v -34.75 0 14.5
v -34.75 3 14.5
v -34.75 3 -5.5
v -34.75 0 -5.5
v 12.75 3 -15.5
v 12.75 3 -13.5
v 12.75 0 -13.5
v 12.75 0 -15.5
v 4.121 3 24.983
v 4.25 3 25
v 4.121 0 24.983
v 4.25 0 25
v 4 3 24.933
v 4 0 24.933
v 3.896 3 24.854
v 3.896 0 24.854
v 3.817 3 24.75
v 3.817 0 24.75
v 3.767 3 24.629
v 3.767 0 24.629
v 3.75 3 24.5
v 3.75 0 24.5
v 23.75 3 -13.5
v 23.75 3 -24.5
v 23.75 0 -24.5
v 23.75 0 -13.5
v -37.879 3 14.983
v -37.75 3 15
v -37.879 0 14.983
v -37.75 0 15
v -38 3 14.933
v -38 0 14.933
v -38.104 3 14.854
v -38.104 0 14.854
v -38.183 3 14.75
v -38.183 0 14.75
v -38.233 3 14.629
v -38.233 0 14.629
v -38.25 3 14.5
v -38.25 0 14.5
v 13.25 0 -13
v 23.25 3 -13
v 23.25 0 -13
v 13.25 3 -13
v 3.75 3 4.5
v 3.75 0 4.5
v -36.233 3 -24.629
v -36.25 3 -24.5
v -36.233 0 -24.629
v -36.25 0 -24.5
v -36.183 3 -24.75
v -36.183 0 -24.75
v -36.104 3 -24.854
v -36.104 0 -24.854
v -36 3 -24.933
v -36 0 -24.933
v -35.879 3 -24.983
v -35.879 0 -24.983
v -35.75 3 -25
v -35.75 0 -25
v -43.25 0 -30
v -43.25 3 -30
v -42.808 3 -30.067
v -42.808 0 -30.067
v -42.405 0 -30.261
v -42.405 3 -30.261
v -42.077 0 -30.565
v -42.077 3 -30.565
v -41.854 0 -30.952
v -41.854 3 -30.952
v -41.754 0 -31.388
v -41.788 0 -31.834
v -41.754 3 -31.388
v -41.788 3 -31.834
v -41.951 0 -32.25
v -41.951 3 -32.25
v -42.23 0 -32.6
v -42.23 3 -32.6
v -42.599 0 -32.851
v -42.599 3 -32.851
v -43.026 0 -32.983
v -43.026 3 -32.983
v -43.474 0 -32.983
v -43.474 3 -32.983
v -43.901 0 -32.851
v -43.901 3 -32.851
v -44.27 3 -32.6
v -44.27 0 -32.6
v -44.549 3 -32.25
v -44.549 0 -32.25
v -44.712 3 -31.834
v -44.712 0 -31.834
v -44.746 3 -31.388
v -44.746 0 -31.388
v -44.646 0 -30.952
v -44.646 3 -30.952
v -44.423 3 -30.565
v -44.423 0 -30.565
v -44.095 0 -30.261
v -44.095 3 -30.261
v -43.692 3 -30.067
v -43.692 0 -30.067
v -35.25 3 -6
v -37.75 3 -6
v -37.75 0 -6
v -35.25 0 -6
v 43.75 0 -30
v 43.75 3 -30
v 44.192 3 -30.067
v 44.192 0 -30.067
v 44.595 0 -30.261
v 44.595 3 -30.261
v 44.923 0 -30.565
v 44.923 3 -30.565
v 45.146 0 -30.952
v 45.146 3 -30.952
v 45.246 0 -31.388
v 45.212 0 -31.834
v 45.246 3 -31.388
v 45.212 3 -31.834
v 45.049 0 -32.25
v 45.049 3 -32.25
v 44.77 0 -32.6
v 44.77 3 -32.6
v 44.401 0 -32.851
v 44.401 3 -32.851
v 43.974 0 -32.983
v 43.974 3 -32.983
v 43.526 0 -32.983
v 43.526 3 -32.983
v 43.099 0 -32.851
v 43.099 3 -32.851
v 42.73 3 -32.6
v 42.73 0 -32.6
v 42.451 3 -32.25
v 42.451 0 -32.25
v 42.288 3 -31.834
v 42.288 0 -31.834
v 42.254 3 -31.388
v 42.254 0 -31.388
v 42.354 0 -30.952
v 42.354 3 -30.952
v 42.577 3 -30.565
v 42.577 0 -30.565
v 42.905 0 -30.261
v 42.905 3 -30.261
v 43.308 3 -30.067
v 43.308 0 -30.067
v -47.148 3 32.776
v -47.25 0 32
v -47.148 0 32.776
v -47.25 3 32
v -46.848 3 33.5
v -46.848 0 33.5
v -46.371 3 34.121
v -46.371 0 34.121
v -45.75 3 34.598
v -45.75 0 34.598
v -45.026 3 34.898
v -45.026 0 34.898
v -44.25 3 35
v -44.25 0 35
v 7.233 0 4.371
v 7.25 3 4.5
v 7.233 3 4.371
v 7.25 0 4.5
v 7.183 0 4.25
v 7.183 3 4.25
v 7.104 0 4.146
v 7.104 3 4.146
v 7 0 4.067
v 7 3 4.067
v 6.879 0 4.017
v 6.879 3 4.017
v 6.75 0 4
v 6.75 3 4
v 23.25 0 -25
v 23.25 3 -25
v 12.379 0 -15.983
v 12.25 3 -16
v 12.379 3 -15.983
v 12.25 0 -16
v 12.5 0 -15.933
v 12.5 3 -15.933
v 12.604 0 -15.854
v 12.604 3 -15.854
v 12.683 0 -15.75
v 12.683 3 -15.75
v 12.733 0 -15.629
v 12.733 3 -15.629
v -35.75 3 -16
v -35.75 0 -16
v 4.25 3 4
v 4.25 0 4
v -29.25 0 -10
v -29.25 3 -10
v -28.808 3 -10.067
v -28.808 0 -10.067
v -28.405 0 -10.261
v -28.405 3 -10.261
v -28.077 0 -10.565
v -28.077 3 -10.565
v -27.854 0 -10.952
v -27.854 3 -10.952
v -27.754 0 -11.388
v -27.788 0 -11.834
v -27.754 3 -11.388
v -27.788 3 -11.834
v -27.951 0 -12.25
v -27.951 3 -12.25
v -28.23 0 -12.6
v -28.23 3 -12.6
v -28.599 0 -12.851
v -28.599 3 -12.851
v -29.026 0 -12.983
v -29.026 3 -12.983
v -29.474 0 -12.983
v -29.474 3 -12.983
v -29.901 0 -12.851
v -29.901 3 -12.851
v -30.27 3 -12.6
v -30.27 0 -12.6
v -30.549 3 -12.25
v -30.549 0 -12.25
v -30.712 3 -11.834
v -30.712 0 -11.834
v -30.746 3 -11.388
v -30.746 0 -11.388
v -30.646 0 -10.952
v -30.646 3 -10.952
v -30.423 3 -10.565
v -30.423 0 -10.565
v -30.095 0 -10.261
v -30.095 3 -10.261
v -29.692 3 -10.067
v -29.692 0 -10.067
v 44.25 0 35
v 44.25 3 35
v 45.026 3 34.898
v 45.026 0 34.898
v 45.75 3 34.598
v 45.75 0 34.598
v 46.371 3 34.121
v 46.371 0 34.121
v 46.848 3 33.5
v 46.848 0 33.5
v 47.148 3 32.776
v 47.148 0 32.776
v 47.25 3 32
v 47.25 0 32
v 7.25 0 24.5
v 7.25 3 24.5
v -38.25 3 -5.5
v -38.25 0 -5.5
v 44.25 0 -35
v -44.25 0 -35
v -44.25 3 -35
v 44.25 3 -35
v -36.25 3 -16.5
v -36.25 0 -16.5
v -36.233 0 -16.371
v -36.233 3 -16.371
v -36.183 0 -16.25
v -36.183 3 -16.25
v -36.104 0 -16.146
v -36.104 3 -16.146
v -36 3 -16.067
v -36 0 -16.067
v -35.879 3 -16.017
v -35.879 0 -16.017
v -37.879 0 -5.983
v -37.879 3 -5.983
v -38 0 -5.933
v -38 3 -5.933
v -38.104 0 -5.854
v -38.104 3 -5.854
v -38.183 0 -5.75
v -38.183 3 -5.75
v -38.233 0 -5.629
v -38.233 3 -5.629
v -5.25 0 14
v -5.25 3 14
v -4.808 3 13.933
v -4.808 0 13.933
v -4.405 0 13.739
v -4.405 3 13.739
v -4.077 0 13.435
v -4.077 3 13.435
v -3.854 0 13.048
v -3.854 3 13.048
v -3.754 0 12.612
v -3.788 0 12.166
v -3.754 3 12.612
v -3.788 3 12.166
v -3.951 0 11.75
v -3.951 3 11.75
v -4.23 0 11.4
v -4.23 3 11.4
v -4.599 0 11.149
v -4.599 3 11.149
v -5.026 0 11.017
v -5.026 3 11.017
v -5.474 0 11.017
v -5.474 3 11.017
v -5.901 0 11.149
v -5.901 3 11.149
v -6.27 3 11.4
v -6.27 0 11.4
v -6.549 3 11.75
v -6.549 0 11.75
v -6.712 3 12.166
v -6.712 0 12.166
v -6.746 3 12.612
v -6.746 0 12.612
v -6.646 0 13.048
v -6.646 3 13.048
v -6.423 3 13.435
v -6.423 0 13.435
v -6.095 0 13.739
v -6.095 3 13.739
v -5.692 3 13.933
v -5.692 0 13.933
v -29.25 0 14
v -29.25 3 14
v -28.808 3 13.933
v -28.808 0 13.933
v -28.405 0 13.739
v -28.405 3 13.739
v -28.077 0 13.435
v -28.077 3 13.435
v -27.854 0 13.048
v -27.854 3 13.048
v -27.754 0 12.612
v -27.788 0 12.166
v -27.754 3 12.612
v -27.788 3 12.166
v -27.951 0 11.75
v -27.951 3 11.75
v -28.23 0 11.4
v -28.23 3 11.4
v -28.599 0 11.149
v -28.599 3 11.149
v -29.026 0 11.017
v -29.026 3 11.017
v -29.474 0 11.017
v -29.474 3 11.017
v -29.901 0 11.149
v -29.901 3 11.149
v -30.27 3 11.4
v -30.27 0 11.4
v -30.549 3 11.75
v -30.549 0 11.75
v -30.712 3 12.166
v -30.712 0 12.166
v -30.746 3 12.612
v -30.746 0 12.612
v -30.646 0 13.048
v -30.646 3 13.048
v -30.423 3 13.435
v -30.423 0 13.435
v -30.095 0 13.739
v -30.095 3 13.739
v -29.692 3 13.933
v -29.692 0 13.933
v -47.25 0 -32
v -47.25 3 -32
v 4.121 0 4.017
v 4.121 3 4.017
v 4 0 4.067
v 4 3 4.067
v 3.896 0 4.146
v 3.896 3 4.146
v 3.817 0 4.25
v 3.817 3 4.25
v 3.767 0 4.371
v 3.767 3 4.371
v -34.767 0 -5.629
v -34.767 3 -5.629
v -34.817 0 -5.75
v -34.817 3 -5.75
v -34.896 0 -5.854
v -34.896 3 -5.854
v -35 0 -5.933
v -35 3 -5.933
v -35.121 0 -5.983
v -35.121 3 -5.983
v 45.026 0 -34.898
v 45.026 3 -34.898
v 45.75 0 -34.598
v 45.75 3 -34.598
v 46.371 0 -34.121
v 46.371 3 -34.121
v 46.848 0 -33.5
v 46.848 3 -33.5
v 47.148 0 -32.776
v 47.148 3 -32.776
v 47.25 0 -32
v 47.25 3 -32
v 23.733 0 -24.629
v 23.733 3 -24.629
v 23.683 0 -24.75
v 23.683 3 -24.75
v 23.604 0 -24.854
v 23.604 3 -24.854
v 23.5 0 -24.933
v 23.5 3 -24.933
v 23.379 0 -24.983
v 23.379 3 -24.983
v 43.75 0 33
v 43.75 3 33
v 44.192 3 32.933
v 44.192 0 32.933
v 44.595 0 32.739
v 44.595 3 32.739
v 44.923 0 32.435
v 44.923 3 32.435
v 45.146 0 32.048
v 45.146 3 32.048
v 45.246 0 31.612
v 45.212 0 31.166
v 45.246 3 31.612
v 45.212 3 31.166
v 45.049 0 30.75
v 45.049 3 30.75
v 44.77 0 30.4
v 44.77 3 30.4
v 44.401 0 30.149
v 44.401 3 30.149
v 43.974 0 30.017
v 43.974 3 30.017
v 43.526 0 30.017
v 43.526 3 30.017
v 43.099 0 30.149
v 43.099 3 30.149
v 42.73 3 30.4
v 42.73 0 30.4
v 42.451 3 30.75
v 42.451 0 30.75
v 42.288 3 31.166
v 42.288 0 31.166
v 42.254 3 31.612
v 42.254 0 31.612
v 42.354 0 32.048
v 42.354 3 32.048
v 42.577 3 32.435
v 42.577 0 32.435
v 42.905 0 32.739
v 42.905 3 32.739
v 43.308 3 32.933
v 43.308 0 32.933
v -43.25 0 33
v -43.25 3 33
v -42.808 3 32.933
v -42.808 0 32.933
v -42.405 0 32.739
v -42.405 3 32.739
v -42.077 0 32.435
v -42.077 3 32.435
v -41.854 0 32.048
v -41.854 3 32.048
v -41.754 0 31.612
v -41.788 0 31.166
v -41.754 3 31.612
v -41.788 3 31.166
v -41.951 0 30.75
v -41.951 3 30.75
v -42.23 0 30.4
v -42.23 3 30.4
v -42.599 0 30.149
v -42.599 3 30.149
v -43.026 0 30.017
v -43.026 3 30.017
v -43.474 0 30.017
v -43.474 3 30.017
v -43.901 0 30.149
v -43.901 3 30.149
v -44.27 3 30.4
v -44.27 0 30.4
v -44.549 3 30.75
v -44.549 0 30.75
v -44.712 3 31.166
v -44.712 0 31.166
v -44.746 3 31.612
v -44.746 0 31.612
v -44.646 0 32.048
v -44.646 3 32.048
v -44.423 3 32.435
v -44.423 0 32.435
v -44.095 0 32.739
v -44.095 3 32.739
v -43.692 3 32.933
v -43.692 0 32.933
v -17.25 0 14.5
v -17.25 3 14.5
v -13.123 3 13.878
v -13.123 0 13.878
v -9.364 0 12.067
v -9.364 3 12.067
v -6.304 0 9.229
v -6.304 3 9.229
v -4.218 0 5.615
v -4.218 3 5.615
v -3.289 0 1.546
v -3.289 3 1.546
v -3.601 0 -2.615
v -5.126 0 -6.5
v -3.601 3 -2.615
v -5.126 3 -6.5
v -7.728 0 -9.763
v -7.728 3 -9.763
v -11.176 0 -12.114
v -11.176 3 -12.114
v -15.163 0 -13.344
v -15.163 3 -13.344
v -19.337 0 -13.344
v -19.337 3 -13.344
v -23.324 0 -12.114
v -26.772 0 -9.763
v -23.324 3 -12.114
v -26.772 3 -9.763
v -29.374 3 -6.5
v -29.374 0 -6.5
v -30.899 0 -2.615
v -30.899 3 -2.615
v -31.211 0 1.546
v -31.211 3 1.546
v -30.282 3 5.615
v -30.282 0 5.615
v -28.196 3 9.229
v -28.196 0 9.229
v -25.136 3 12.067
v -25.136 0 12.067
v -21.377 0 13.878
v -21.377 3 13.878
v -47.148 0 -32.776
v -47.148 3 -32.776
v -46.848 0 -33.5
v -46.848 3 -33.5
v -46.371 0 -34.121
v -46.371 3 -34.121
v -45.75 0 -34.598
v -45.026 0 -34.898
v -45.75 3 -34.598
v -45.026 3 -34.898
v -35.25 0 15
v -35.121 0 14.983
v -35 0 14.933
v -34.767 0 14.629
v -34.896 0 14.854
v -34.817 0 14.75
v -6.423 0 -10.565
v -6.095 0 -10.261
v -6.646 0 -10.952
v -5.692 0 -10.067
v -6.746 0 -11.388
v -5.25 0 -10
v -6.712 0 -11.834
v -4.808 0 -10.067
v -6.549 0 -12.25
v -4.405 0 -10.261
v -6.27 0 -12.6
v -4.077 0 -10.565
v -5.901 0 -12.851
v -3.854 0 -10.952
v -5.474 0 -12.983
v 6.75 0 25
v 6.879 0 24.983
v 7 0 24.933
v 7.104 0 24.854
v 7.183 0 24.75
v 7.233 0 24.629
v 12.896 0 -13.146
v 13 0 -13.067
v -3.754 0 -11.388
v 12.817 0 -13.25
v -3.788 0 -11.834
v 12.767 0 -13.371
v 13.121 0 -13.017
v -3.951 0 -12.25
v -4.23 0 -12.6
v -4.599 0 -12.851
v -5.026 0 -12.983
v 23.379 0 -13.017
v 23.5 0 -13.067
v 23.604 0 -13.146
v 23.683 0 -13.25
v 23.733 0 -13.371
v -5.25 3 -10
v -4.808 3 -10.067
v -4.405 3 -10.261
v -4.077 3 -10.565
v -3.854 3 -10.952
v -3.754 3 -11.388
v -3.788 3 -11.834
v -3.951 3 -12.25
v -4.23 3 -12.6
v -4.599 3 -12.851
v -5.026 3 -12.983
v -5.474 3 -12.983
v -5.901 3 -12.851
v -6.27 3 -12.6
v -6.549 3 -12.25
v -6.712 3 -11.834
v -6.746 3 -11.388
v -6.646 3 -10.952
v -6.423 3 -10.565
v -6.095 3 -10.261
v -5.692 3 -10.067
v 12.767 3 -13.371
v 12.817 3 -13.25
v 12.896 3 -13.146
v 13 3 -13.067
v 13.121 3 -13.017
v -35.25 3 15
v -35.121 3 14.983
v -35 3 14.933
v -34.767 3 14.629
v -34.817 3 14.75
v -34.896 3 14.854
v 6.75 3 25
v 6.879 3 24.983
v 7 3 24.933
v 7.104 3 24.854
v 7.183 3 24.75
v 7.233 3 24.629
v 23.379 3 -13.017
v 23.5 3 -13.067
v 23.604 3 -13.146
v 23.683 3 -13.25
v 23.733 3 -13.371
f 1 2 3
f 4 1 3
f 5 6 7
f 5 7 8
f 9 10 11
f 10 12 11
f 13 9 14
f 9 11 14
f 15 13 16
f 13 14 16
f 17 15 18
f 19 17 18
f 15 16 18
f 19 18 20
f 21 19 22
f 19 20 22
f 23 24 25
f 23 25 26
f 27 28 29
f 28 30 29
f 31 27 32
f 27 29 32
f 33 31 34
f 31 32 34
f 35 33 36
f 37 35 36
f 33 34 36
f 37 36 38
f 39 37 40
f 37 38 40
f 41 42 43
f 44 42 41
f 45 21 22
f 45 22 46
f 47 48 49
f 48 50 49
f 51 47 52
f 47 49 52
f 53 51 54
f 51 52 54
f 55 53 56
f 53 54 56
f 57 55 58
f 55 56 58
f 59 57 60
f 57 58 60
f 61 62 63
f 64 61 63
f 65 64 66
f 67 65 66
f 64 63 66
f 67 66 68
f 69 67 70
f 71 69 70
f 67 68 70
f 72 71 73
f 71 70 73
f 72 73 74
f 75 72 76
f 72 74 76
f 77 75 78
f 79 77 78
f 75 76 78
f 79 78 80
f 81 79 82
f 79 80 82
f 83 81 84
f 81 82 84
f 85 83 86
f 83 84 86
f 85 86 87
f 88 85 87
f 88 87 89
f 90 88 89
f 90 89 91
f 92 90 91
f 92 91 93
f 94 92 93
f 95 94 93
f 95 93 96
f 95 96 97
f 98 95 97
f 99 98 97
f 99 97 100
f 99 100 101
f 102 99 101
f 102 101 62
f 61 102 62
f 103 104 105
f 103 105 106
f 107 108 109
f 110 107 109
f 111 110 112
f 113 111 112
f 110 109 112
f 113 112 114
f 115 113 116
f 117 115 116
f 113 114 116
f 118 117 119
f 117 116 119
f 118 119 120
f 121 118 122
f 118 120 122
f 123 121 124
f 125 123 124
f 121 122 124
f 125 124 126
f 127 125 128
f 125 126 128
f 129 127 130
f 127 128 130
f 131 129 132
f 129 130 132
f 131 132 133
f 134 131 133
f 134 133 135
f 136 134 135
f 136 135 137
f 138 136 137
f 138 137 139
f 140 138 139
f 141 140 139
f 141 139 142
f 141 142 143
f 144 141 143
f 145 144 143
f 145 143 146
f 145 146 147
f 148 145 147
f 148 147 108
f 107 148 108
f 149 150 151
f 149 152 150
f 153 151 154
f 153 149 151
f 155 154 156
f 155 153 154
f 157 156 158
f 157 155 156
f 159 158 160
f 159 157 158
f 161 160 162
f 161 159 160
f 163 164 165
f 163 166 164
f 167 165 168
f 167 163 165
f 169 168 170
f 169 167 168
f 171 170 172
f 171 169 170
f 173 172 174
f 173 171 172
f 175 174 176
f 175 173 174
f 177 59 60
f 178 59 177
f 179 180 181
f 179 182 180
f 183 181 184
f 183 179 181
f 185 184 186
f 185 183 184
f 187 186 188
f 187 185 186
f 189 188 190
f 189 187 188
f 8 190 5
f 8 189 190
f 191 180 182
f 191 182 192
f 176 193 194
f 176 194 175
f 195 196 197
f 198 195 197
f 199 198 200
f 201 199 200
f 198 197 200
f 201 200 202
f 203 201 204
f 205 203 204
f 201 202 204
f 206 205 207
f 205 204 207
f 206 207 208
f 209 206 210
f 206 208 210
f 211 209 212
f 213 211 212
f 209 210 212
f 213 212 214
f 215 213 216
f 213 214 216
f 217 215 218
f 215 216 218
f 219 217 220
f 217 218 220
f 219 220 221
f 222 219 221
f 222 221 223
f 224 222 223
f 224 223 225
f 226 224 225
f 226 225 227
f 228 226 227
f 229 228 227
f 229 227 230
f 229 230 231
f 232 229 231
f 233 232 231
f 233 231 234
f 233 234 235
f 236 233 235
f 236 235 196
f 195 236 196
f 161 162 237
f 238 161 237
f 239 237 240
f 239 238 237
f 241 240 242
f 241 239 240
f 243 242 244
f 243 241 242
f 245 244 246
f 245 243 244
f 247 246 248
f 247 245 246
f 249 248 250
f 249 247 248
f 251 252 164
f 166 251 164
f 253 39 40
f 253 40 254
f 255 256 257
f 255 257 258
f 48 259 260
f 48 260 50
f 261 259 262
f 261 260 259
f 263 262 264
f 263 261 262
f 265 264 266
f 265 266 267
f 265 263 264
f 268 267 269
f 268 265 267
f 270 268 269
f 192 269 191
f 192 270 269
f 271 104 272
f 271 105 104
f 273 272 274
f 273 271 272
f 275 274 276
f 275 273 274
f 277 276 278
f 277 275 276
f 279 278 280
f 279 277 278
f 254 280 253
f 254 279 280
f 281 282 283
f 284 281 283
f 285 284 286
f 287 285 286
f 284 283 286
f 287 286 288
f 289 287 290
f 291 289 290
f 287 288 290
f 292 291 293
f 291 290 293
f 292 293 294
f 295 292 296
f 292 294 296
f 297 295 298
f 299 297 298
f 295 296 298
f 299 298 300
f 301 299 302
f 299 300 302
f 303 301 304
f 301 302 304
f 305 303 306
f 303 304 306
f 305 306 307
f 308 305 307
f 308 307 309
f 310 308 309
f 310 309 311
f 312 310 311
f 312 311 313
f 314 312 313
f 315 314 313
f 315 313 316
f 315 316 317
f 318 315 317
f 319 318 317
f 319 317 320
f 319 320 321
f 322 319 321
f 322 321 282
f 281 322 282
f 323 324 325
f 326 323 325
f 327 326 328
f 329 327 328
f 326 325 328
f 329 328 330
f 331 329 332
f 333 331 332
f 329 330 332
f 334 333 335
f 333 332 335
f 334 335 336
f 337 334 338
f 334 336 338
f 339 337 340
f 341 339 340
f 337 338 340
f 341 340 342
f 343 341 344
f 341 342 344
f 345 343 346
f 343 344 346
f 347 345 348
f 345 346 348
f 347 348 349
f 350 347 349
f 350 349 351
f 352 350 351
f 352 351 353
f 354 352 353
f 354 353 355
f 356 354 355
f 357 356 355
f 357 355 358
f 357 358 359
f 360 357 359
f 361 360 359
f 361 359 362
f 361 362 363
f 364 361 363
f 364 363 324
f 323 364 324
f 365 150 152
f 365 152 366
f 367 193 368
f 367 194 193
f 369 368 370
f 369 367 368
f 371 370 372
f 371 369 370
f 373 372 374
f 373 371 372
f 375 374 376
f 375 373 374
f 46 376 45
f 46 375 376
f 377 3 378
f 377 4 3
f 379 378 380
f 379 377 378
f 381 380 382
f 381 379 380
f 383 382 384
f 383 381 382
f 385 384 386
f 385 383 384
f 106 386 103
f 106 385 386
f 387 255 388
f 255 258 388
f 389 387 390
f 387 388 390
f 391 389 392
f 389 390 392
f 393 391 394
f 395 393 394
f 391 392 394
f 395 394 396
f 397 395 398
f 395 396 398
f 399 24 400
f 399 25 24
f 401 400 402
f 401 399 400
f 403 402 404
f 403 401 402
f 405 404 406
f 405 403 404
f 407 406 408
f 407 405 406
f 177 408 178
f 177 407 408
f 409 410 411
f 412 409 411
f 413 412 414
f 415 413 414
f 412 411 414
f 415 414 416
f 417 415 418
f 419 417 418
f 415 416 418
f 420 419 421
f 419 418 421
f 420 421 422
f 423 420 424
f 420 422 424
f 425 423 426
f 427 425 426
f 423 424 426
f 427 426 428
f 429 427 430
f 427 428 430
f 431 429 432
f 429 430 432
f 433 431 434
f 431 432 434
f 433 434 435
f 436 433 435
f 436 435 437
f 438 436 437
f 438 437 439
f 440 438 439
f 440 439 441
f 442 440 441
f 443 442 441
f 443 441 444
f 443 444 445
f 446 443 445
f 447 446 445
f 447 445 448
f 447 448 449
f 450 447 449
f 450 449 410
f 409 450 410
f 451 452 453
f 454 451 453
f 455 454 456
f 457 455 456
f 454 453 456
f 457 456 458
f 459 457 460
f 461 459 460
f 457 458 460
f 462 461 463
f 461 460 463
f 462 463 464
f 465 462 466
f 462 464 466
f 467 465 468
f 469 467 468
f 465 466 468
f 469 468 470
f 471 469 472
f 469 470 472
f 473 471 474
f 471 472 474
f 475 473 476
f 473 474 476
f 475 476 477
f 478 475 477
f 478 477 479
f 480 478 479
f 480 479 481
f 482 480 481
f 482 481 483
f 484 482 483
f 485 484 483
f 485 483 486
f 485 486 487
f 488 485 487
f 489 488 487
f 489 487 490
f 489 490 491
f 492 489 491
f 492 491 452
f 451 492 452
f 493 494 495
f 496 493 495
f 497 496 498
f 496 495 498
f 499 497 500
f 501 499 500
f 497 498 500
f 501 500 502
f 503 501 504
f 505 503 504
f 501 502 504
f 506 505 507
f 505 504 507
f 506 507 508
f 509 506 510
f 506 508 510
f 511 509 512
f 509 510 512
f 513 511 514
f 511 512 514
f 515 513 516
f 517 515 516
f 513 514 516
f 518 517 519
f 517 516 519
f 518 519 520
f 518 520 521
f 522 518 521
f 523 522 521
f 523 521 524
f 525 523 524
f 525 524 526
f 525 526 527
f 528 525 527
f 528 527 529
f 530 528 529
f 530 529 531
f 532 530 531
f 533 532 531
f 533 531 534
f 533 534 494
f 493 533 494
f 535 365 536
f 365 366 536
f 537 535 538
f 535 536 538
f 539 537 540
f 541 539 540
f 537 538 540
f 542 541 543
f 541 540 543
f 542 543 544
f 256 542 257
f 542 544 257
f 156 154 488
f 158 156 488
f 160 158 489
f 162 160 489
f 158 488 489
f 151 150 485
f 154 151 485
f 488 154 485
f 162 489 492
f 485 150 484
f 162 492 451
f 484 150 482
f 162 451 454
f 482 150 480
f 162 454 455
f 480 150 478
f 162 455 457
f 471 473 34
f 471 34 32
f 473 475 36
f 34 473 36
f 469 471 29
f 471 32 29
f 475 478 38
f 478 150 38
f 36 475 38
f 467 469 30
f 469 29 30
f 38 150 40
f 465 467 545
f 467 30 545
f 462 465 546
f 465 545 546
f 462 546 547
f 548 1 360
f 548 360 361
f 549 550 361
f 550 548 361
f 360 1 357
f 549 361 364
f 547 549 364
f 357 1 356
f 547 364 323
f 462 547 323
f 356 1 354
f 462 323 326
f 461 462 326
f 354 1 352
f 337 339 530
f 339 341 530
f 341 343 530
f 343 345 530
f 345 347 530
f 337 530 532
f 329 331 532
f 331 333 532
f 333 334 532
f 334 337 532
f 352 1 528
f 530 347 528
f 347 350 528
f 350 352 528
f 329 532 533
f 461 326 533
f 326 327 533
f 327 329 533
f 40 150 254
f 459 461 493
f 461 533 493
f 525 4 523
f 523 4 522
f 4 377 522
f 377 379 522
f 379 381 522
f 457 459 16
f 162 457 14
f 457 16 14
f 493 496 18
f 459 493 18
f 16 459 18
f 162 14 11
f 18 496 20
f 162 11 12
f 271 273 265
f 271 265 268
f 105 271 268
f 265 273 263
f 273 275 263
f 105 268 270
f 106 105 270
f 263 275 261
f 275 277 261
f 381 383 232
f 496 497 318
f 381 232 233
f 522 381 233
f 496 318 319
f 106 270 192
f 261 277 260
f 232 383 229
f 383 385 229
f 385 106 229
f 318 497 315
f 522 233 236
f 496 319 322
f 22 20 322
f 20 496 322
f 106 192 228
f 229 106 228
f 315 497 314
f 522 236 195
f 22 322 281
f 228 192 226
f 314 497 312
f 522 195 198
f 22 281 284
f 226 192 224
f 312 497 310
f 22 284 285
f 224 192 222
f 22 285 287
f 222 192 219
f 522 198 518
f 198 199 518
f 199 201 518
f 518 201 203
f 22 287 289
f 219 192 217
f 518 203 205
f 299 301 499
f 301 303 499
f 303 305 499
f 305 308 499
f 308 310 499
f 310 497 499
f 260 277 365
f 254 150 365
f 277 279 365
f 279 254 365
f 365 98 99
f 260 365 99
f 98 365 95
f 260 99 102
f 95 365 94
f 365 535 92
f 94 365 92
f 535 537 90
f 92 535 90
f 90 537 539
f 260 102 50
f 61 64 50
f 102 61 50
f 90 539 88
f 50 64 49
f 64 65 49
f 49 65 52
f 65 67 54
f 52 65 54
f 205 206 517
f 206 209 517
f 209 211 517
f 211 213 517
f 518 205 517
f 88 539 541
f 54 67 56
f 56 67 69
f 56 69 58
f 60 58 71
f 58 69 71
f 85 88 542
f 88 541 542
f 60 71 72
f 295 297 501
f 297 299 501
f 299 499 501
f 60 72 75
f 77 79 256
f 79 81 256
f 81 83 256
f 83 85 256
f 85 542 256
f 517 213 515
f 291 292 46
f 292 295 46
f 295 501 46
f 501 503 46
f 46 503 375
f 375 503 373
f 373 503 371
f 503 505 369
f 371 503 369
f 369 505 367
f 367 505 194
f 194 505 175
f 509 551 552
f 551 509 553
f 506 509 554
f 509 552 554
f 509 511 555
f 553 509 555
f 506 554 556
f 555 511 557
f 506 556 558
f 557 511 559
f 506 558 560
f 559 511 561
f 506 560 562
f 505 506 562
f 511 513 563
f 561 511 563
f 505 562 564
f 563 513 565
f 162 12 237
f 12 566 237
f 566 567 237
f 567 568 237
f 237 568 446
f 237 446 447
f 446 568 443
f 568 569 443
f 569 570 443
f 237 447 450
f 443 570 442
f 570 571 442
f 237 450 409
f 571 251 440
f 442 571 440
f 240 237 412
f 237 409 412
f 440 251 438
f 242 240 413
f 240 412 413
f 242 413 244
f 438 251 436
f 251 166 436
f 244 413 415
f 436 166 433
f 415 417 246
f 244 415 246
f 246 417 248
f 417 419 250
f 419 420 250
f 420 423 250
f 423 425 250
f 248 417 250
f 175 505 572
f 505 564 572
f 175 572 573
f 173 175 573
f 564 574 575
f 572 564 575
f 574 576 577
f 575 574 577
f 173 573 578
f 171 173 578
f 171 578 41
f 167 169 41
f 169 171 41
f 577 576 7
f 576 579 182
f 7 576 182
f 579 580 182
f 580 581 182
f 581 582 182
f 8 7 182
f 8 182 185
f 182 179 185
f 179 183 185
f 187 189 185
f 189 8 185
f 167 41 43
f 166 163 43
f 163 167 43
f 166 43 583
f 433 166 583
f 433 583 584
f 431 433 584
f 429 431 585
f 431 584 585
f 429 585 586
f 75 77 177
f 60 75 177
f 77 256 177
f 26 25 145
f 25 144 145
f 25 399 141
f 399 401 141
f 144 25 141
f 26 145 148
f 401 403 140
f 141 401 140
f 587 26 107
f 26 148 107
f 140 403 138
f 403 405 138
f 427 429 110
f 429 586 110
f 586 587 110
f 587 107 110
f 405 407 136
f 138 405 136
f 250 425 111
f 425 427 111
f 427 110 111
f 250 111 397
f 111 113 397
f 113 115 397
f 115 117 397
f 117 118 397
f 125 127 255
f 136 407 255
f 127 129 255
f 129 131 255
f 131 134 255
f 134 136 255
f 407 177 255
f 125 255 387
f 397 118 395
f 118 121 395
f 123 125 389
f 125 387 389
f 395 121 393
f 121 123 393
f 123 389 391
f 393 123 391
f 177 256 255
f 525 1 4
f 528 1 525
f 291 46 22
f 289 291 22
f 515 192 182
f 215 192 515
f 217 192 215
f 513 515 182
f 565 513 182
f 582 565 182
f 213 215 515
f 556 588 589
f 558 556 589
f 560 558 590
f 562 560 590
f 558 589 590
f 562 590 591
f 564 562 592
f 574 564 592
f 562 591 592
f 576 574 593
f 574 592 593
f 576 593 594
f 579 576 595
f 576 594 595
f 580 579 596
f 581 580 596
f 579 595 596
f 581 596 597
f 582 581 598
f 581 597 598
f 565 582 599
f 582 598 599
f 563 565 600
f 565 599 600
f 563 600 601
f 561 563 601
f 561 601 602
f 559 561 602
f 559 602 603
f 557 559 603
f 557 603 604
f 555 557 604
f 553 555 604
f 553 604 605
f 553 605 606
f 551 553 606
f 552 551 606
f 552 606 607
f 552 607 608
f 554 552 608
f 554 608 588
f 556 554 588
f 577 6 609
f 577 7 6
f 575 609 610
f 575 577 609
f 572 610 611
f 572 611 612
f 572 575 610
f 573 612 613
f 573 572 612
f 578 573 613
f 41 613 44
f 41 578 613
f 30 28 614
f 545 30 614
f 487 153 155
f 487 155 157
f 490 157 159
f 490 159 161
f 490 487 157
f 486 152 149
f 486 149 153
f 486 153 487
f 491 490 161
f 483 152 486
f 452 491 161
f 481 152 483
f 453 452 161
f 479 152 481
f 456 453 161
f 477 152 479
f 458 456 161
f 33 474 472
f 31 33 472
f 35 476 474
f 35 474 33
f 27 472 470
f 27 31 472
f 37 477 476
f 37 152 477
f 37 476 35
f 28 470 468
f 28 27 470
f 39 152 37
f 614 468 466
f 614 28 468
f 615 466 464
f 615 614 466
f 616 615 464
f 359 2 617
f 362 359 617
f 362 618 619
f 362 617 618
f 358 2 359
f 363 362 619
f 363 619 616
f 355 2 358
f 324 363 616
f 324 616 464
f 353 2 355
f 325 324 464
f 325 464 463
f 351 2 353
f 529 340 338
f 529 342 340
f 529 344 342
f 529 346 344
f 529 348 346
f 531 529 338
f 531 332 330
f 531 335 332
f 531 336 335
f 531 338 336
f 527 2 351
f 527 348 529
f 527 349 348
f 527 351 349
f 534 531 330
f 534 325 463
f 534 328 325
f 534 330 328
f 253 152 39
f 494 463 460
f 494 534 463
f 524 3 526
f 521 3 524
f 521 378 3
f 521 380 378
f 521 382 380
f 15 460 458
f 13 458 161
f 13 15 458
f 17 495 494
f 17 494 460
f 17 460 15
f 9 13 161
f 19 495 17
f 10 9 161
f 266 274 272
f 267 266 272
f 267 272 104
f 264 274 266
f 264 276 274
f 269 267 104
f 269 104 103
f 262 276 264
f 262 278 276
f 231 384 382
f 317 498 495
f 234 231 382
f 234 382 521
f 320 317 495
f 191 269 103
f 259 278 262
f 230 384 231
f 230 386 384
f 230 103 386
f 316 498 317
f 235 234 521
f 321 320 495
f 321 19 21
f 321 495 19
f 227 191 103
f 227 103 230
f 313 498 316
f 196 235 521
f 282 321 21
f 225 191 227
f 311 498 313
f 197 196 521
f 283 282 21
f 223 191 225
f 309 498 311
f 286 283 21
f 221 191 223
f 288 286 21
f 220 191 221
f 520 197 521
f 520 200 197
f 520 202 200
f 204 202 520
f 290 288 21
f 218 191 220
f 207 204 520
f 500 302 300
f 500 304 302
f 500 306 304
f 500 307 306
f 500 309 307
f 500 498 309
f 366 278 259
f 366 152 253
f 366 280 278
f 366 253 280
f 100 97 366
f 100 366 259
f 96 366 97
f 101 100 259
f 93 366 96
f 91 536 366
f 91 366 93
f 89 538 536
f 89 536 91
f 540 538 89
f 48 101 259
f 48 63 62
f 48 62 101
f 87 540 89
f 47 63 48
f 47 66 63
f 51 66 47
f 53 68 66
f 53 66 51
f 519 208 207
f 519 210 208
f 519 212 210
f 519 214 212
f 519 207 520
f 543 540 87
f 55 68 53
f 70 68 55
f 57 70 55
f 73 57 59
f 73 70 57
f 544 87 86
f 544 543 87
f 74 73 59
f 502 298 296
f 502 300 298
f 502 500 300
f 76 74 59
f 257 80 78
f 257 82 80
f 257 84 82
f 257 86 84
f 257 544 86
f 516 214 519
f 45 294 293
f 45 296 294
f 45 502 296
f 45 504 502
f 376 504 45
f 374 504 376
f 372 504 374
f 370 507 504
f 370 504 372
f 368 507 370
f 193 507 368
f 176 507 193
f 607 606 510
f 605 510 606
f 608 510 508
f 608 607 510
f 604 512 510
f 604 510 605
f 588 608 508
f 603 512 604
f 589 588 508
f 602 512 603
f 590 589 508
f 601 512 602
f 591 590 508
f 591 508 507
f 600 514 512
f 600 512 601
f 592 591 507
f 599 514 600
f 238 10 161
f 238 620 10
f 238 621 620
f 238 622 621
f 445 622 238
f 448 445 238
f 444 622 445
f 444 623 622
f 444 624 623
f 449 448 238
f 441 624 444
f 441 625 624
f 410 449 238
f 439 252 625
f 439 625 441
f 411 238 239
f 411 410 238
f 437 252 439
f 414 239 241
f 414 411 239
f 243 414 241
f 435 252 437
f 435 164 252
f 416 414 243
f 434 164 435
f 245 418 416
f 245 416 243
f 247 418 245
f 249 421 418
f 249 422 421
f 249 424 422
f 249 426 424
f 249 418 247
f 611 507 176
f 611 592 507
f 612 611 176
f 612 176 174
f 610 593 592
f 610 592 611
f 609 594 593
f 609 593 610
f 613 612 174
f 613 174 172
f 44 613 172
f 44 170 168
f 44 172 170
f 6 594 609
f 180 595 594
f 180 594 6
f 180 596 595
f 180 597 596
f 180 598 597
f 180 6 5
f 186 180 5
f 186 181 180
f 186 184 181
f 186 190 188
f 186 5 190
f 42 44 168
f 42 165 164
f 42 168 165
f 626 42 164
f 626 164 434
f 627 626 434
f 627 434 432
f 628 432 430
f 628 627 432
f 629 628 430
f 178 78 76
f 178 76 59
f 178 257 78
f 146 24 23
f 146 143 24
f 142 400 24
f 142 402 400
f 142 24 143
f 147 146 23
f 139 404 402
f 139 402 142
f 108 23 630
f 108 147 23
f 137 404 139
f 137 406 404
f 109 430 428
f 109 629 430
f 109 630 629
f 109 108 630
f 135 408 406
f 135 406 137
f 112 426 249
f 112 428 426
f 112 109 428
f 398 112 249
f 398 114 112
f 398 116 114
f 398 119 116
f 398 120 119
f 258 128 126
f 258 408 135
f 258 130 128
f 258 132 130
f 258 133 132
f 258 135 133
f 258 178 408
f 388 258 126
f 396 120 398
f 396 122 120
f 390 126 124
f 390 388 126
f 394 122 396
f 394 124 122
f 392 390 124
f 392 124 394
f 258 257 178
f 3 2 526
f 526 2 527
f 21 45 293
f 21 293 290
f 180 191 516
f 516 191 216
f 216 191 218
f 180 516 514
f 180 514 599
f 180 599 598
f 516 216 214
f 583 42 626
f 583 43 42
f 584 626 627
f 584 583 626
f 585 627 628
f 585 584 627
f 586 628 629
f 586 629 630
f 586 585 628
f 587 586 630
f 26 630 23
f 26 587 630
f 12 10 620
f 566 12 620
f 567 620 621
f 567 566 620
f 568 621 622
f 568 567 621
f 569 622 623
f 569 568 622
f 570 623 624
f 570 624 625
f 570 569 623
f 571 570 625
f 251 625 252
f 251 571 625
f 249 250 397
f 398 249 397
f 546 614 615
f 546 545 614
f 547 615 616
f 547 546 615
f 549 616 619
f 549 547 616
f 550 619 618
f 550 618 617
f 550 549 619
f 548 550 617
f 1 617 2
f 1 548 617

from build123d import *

# Parameters (mm, degrees)
SKETCH1_W           = 94.5
SKETCH1_H           = 70
BOSS_EXTRUDE1_DEPTH = 3
SKETCH2_R           = 14
SKETCH2_R_2         = 1.5
SKETCH2_W           = 3.5
SKETCH2_H           = 21
CUT_EXTRUDE1_DEPTH  = 59.877521177
FILLET1_R           = 0.5
SKETCH3_R           = 1.5
CUT_EXTRUDE2_DEPTH  = 59.877521177
FILLET2_R           = 3


with BuildPart() as part:
    # Sketch1 → Boss-Extrude1 (new body)
    with BuildSketch(Plane(origin=(0, 0, 0), x_dir=(1, 0, 0), z_dir=(0, 1, 0))):
        Rectangle(SKETCH1_W, SKETCH1_H)
    extrude(amount=BOSS_EXTRUDE1_DEPTH)

    # Sketch2 → Cut-Extrude1 (cut, through all)
    with BuildSketch(Plane(origin=(0, 3, 0), x_dir=(1, 0, 0), z_dir=(0, 1, 0))):
        with Locations(Location((-17.25, -0.5, 0), (0, 0, 270))):
            Circle(SKETCH2_R)
        with Locations(Location((-5.25, 11.5, 0), (0, 0, 270))):
            Circle(SKETCH2_R_2)
        with Locations(Location((-29.25, 11.5, 0), (0, 0, 270))):
            Circle(SKETCH2_R_2)
        with Locations(Location((-29.25, -12.5, 0), (0, 0, 270))):
            Circle(SKETCH2_R_2)
        with Locations(Location((-5.25, -12.5, 0), (0, 0, 270))):
            Circle(SKETCH2_R_2)
        Polygon((-36.25, 25), (23.75, 25), (23.75, 13), (12.75, 13), (12.75, 16), (-36.25, 16), align=None)
        with Locations((-36.5, -4.5)):
            Rectangle(SKETCH2_W, SKETCH2_H)
        with Locations((5.5, -14.5)):
            Rectangle(SKETCH2_W, SKETCH2_H)
    extrude(amount=-CUT_EXTRUDE1_DEPTH, mode=Mode.SUBTRACT)

    # Fillet1
    fillet1_edges = [part.edges().sort_by_distance(p)[0] for p in [
        (3.75, 1.5, 25),
        (3.75, 1.5, 4),
        (7.25, 1.5, 4),
        (7.25, 1.5, 25),
        (-38.25, 1.5, -6),
        (-34.75, 1.5, -6),
        (-34.75, 1.5, 15),
        (-38.25, 1.5, 15),
        (-36.25, 1.5, -16),
        (-36.25, 1.5, -25),
        (23.75, 1.5, -25),
        (23.75, 1.5, -13),
        (12.75, 1.5, -13),
        (12.75, 1.5, -16),
    ]]
    fillet(fillet1_edges, radius=FILLET1_R)

    # Sketch3 → Cut-Extrude2 (cut, through all)
    with BuildSketch(Plane(origin=(0, 3, 0), x_dir=(1, 0, 0), z_dir=(0, 1, 0))):
        with Locations(Location((43.75, 31.5, 0), (0, 0, 270))):
            Circle(SKETCH3_R)
        with Locations(Location((-43.25, 31.5, 0), (0, 0, 270))):
            Circle(SKETCH3_R)
        with Locations(Location((-43.25, -31.5, 0), (0, 0, 270))):
            Circle(SKETCH3_R)
        with Locations(Location((43.75, -31.5, 0), (0, 0, 270))):
            Circle(SKETCH3_R)
    extrude(amount=-CUT_EXTRUDE2_DEPTH, mode=Mode.SUBTRACT)

    # Fillet2
    fillet2_edges = [part.edges().sort_by_distance(p)[0] for p in [
        (47.25, 1.5, 35),
        (-47.25, 1.5, 35),
        (-47.25, 1.5, -35),
        (47.25, 1.5, -35),
    ]]
    fillet(fillet2_edges, radius=FILLET2_R)


solid = part.part
